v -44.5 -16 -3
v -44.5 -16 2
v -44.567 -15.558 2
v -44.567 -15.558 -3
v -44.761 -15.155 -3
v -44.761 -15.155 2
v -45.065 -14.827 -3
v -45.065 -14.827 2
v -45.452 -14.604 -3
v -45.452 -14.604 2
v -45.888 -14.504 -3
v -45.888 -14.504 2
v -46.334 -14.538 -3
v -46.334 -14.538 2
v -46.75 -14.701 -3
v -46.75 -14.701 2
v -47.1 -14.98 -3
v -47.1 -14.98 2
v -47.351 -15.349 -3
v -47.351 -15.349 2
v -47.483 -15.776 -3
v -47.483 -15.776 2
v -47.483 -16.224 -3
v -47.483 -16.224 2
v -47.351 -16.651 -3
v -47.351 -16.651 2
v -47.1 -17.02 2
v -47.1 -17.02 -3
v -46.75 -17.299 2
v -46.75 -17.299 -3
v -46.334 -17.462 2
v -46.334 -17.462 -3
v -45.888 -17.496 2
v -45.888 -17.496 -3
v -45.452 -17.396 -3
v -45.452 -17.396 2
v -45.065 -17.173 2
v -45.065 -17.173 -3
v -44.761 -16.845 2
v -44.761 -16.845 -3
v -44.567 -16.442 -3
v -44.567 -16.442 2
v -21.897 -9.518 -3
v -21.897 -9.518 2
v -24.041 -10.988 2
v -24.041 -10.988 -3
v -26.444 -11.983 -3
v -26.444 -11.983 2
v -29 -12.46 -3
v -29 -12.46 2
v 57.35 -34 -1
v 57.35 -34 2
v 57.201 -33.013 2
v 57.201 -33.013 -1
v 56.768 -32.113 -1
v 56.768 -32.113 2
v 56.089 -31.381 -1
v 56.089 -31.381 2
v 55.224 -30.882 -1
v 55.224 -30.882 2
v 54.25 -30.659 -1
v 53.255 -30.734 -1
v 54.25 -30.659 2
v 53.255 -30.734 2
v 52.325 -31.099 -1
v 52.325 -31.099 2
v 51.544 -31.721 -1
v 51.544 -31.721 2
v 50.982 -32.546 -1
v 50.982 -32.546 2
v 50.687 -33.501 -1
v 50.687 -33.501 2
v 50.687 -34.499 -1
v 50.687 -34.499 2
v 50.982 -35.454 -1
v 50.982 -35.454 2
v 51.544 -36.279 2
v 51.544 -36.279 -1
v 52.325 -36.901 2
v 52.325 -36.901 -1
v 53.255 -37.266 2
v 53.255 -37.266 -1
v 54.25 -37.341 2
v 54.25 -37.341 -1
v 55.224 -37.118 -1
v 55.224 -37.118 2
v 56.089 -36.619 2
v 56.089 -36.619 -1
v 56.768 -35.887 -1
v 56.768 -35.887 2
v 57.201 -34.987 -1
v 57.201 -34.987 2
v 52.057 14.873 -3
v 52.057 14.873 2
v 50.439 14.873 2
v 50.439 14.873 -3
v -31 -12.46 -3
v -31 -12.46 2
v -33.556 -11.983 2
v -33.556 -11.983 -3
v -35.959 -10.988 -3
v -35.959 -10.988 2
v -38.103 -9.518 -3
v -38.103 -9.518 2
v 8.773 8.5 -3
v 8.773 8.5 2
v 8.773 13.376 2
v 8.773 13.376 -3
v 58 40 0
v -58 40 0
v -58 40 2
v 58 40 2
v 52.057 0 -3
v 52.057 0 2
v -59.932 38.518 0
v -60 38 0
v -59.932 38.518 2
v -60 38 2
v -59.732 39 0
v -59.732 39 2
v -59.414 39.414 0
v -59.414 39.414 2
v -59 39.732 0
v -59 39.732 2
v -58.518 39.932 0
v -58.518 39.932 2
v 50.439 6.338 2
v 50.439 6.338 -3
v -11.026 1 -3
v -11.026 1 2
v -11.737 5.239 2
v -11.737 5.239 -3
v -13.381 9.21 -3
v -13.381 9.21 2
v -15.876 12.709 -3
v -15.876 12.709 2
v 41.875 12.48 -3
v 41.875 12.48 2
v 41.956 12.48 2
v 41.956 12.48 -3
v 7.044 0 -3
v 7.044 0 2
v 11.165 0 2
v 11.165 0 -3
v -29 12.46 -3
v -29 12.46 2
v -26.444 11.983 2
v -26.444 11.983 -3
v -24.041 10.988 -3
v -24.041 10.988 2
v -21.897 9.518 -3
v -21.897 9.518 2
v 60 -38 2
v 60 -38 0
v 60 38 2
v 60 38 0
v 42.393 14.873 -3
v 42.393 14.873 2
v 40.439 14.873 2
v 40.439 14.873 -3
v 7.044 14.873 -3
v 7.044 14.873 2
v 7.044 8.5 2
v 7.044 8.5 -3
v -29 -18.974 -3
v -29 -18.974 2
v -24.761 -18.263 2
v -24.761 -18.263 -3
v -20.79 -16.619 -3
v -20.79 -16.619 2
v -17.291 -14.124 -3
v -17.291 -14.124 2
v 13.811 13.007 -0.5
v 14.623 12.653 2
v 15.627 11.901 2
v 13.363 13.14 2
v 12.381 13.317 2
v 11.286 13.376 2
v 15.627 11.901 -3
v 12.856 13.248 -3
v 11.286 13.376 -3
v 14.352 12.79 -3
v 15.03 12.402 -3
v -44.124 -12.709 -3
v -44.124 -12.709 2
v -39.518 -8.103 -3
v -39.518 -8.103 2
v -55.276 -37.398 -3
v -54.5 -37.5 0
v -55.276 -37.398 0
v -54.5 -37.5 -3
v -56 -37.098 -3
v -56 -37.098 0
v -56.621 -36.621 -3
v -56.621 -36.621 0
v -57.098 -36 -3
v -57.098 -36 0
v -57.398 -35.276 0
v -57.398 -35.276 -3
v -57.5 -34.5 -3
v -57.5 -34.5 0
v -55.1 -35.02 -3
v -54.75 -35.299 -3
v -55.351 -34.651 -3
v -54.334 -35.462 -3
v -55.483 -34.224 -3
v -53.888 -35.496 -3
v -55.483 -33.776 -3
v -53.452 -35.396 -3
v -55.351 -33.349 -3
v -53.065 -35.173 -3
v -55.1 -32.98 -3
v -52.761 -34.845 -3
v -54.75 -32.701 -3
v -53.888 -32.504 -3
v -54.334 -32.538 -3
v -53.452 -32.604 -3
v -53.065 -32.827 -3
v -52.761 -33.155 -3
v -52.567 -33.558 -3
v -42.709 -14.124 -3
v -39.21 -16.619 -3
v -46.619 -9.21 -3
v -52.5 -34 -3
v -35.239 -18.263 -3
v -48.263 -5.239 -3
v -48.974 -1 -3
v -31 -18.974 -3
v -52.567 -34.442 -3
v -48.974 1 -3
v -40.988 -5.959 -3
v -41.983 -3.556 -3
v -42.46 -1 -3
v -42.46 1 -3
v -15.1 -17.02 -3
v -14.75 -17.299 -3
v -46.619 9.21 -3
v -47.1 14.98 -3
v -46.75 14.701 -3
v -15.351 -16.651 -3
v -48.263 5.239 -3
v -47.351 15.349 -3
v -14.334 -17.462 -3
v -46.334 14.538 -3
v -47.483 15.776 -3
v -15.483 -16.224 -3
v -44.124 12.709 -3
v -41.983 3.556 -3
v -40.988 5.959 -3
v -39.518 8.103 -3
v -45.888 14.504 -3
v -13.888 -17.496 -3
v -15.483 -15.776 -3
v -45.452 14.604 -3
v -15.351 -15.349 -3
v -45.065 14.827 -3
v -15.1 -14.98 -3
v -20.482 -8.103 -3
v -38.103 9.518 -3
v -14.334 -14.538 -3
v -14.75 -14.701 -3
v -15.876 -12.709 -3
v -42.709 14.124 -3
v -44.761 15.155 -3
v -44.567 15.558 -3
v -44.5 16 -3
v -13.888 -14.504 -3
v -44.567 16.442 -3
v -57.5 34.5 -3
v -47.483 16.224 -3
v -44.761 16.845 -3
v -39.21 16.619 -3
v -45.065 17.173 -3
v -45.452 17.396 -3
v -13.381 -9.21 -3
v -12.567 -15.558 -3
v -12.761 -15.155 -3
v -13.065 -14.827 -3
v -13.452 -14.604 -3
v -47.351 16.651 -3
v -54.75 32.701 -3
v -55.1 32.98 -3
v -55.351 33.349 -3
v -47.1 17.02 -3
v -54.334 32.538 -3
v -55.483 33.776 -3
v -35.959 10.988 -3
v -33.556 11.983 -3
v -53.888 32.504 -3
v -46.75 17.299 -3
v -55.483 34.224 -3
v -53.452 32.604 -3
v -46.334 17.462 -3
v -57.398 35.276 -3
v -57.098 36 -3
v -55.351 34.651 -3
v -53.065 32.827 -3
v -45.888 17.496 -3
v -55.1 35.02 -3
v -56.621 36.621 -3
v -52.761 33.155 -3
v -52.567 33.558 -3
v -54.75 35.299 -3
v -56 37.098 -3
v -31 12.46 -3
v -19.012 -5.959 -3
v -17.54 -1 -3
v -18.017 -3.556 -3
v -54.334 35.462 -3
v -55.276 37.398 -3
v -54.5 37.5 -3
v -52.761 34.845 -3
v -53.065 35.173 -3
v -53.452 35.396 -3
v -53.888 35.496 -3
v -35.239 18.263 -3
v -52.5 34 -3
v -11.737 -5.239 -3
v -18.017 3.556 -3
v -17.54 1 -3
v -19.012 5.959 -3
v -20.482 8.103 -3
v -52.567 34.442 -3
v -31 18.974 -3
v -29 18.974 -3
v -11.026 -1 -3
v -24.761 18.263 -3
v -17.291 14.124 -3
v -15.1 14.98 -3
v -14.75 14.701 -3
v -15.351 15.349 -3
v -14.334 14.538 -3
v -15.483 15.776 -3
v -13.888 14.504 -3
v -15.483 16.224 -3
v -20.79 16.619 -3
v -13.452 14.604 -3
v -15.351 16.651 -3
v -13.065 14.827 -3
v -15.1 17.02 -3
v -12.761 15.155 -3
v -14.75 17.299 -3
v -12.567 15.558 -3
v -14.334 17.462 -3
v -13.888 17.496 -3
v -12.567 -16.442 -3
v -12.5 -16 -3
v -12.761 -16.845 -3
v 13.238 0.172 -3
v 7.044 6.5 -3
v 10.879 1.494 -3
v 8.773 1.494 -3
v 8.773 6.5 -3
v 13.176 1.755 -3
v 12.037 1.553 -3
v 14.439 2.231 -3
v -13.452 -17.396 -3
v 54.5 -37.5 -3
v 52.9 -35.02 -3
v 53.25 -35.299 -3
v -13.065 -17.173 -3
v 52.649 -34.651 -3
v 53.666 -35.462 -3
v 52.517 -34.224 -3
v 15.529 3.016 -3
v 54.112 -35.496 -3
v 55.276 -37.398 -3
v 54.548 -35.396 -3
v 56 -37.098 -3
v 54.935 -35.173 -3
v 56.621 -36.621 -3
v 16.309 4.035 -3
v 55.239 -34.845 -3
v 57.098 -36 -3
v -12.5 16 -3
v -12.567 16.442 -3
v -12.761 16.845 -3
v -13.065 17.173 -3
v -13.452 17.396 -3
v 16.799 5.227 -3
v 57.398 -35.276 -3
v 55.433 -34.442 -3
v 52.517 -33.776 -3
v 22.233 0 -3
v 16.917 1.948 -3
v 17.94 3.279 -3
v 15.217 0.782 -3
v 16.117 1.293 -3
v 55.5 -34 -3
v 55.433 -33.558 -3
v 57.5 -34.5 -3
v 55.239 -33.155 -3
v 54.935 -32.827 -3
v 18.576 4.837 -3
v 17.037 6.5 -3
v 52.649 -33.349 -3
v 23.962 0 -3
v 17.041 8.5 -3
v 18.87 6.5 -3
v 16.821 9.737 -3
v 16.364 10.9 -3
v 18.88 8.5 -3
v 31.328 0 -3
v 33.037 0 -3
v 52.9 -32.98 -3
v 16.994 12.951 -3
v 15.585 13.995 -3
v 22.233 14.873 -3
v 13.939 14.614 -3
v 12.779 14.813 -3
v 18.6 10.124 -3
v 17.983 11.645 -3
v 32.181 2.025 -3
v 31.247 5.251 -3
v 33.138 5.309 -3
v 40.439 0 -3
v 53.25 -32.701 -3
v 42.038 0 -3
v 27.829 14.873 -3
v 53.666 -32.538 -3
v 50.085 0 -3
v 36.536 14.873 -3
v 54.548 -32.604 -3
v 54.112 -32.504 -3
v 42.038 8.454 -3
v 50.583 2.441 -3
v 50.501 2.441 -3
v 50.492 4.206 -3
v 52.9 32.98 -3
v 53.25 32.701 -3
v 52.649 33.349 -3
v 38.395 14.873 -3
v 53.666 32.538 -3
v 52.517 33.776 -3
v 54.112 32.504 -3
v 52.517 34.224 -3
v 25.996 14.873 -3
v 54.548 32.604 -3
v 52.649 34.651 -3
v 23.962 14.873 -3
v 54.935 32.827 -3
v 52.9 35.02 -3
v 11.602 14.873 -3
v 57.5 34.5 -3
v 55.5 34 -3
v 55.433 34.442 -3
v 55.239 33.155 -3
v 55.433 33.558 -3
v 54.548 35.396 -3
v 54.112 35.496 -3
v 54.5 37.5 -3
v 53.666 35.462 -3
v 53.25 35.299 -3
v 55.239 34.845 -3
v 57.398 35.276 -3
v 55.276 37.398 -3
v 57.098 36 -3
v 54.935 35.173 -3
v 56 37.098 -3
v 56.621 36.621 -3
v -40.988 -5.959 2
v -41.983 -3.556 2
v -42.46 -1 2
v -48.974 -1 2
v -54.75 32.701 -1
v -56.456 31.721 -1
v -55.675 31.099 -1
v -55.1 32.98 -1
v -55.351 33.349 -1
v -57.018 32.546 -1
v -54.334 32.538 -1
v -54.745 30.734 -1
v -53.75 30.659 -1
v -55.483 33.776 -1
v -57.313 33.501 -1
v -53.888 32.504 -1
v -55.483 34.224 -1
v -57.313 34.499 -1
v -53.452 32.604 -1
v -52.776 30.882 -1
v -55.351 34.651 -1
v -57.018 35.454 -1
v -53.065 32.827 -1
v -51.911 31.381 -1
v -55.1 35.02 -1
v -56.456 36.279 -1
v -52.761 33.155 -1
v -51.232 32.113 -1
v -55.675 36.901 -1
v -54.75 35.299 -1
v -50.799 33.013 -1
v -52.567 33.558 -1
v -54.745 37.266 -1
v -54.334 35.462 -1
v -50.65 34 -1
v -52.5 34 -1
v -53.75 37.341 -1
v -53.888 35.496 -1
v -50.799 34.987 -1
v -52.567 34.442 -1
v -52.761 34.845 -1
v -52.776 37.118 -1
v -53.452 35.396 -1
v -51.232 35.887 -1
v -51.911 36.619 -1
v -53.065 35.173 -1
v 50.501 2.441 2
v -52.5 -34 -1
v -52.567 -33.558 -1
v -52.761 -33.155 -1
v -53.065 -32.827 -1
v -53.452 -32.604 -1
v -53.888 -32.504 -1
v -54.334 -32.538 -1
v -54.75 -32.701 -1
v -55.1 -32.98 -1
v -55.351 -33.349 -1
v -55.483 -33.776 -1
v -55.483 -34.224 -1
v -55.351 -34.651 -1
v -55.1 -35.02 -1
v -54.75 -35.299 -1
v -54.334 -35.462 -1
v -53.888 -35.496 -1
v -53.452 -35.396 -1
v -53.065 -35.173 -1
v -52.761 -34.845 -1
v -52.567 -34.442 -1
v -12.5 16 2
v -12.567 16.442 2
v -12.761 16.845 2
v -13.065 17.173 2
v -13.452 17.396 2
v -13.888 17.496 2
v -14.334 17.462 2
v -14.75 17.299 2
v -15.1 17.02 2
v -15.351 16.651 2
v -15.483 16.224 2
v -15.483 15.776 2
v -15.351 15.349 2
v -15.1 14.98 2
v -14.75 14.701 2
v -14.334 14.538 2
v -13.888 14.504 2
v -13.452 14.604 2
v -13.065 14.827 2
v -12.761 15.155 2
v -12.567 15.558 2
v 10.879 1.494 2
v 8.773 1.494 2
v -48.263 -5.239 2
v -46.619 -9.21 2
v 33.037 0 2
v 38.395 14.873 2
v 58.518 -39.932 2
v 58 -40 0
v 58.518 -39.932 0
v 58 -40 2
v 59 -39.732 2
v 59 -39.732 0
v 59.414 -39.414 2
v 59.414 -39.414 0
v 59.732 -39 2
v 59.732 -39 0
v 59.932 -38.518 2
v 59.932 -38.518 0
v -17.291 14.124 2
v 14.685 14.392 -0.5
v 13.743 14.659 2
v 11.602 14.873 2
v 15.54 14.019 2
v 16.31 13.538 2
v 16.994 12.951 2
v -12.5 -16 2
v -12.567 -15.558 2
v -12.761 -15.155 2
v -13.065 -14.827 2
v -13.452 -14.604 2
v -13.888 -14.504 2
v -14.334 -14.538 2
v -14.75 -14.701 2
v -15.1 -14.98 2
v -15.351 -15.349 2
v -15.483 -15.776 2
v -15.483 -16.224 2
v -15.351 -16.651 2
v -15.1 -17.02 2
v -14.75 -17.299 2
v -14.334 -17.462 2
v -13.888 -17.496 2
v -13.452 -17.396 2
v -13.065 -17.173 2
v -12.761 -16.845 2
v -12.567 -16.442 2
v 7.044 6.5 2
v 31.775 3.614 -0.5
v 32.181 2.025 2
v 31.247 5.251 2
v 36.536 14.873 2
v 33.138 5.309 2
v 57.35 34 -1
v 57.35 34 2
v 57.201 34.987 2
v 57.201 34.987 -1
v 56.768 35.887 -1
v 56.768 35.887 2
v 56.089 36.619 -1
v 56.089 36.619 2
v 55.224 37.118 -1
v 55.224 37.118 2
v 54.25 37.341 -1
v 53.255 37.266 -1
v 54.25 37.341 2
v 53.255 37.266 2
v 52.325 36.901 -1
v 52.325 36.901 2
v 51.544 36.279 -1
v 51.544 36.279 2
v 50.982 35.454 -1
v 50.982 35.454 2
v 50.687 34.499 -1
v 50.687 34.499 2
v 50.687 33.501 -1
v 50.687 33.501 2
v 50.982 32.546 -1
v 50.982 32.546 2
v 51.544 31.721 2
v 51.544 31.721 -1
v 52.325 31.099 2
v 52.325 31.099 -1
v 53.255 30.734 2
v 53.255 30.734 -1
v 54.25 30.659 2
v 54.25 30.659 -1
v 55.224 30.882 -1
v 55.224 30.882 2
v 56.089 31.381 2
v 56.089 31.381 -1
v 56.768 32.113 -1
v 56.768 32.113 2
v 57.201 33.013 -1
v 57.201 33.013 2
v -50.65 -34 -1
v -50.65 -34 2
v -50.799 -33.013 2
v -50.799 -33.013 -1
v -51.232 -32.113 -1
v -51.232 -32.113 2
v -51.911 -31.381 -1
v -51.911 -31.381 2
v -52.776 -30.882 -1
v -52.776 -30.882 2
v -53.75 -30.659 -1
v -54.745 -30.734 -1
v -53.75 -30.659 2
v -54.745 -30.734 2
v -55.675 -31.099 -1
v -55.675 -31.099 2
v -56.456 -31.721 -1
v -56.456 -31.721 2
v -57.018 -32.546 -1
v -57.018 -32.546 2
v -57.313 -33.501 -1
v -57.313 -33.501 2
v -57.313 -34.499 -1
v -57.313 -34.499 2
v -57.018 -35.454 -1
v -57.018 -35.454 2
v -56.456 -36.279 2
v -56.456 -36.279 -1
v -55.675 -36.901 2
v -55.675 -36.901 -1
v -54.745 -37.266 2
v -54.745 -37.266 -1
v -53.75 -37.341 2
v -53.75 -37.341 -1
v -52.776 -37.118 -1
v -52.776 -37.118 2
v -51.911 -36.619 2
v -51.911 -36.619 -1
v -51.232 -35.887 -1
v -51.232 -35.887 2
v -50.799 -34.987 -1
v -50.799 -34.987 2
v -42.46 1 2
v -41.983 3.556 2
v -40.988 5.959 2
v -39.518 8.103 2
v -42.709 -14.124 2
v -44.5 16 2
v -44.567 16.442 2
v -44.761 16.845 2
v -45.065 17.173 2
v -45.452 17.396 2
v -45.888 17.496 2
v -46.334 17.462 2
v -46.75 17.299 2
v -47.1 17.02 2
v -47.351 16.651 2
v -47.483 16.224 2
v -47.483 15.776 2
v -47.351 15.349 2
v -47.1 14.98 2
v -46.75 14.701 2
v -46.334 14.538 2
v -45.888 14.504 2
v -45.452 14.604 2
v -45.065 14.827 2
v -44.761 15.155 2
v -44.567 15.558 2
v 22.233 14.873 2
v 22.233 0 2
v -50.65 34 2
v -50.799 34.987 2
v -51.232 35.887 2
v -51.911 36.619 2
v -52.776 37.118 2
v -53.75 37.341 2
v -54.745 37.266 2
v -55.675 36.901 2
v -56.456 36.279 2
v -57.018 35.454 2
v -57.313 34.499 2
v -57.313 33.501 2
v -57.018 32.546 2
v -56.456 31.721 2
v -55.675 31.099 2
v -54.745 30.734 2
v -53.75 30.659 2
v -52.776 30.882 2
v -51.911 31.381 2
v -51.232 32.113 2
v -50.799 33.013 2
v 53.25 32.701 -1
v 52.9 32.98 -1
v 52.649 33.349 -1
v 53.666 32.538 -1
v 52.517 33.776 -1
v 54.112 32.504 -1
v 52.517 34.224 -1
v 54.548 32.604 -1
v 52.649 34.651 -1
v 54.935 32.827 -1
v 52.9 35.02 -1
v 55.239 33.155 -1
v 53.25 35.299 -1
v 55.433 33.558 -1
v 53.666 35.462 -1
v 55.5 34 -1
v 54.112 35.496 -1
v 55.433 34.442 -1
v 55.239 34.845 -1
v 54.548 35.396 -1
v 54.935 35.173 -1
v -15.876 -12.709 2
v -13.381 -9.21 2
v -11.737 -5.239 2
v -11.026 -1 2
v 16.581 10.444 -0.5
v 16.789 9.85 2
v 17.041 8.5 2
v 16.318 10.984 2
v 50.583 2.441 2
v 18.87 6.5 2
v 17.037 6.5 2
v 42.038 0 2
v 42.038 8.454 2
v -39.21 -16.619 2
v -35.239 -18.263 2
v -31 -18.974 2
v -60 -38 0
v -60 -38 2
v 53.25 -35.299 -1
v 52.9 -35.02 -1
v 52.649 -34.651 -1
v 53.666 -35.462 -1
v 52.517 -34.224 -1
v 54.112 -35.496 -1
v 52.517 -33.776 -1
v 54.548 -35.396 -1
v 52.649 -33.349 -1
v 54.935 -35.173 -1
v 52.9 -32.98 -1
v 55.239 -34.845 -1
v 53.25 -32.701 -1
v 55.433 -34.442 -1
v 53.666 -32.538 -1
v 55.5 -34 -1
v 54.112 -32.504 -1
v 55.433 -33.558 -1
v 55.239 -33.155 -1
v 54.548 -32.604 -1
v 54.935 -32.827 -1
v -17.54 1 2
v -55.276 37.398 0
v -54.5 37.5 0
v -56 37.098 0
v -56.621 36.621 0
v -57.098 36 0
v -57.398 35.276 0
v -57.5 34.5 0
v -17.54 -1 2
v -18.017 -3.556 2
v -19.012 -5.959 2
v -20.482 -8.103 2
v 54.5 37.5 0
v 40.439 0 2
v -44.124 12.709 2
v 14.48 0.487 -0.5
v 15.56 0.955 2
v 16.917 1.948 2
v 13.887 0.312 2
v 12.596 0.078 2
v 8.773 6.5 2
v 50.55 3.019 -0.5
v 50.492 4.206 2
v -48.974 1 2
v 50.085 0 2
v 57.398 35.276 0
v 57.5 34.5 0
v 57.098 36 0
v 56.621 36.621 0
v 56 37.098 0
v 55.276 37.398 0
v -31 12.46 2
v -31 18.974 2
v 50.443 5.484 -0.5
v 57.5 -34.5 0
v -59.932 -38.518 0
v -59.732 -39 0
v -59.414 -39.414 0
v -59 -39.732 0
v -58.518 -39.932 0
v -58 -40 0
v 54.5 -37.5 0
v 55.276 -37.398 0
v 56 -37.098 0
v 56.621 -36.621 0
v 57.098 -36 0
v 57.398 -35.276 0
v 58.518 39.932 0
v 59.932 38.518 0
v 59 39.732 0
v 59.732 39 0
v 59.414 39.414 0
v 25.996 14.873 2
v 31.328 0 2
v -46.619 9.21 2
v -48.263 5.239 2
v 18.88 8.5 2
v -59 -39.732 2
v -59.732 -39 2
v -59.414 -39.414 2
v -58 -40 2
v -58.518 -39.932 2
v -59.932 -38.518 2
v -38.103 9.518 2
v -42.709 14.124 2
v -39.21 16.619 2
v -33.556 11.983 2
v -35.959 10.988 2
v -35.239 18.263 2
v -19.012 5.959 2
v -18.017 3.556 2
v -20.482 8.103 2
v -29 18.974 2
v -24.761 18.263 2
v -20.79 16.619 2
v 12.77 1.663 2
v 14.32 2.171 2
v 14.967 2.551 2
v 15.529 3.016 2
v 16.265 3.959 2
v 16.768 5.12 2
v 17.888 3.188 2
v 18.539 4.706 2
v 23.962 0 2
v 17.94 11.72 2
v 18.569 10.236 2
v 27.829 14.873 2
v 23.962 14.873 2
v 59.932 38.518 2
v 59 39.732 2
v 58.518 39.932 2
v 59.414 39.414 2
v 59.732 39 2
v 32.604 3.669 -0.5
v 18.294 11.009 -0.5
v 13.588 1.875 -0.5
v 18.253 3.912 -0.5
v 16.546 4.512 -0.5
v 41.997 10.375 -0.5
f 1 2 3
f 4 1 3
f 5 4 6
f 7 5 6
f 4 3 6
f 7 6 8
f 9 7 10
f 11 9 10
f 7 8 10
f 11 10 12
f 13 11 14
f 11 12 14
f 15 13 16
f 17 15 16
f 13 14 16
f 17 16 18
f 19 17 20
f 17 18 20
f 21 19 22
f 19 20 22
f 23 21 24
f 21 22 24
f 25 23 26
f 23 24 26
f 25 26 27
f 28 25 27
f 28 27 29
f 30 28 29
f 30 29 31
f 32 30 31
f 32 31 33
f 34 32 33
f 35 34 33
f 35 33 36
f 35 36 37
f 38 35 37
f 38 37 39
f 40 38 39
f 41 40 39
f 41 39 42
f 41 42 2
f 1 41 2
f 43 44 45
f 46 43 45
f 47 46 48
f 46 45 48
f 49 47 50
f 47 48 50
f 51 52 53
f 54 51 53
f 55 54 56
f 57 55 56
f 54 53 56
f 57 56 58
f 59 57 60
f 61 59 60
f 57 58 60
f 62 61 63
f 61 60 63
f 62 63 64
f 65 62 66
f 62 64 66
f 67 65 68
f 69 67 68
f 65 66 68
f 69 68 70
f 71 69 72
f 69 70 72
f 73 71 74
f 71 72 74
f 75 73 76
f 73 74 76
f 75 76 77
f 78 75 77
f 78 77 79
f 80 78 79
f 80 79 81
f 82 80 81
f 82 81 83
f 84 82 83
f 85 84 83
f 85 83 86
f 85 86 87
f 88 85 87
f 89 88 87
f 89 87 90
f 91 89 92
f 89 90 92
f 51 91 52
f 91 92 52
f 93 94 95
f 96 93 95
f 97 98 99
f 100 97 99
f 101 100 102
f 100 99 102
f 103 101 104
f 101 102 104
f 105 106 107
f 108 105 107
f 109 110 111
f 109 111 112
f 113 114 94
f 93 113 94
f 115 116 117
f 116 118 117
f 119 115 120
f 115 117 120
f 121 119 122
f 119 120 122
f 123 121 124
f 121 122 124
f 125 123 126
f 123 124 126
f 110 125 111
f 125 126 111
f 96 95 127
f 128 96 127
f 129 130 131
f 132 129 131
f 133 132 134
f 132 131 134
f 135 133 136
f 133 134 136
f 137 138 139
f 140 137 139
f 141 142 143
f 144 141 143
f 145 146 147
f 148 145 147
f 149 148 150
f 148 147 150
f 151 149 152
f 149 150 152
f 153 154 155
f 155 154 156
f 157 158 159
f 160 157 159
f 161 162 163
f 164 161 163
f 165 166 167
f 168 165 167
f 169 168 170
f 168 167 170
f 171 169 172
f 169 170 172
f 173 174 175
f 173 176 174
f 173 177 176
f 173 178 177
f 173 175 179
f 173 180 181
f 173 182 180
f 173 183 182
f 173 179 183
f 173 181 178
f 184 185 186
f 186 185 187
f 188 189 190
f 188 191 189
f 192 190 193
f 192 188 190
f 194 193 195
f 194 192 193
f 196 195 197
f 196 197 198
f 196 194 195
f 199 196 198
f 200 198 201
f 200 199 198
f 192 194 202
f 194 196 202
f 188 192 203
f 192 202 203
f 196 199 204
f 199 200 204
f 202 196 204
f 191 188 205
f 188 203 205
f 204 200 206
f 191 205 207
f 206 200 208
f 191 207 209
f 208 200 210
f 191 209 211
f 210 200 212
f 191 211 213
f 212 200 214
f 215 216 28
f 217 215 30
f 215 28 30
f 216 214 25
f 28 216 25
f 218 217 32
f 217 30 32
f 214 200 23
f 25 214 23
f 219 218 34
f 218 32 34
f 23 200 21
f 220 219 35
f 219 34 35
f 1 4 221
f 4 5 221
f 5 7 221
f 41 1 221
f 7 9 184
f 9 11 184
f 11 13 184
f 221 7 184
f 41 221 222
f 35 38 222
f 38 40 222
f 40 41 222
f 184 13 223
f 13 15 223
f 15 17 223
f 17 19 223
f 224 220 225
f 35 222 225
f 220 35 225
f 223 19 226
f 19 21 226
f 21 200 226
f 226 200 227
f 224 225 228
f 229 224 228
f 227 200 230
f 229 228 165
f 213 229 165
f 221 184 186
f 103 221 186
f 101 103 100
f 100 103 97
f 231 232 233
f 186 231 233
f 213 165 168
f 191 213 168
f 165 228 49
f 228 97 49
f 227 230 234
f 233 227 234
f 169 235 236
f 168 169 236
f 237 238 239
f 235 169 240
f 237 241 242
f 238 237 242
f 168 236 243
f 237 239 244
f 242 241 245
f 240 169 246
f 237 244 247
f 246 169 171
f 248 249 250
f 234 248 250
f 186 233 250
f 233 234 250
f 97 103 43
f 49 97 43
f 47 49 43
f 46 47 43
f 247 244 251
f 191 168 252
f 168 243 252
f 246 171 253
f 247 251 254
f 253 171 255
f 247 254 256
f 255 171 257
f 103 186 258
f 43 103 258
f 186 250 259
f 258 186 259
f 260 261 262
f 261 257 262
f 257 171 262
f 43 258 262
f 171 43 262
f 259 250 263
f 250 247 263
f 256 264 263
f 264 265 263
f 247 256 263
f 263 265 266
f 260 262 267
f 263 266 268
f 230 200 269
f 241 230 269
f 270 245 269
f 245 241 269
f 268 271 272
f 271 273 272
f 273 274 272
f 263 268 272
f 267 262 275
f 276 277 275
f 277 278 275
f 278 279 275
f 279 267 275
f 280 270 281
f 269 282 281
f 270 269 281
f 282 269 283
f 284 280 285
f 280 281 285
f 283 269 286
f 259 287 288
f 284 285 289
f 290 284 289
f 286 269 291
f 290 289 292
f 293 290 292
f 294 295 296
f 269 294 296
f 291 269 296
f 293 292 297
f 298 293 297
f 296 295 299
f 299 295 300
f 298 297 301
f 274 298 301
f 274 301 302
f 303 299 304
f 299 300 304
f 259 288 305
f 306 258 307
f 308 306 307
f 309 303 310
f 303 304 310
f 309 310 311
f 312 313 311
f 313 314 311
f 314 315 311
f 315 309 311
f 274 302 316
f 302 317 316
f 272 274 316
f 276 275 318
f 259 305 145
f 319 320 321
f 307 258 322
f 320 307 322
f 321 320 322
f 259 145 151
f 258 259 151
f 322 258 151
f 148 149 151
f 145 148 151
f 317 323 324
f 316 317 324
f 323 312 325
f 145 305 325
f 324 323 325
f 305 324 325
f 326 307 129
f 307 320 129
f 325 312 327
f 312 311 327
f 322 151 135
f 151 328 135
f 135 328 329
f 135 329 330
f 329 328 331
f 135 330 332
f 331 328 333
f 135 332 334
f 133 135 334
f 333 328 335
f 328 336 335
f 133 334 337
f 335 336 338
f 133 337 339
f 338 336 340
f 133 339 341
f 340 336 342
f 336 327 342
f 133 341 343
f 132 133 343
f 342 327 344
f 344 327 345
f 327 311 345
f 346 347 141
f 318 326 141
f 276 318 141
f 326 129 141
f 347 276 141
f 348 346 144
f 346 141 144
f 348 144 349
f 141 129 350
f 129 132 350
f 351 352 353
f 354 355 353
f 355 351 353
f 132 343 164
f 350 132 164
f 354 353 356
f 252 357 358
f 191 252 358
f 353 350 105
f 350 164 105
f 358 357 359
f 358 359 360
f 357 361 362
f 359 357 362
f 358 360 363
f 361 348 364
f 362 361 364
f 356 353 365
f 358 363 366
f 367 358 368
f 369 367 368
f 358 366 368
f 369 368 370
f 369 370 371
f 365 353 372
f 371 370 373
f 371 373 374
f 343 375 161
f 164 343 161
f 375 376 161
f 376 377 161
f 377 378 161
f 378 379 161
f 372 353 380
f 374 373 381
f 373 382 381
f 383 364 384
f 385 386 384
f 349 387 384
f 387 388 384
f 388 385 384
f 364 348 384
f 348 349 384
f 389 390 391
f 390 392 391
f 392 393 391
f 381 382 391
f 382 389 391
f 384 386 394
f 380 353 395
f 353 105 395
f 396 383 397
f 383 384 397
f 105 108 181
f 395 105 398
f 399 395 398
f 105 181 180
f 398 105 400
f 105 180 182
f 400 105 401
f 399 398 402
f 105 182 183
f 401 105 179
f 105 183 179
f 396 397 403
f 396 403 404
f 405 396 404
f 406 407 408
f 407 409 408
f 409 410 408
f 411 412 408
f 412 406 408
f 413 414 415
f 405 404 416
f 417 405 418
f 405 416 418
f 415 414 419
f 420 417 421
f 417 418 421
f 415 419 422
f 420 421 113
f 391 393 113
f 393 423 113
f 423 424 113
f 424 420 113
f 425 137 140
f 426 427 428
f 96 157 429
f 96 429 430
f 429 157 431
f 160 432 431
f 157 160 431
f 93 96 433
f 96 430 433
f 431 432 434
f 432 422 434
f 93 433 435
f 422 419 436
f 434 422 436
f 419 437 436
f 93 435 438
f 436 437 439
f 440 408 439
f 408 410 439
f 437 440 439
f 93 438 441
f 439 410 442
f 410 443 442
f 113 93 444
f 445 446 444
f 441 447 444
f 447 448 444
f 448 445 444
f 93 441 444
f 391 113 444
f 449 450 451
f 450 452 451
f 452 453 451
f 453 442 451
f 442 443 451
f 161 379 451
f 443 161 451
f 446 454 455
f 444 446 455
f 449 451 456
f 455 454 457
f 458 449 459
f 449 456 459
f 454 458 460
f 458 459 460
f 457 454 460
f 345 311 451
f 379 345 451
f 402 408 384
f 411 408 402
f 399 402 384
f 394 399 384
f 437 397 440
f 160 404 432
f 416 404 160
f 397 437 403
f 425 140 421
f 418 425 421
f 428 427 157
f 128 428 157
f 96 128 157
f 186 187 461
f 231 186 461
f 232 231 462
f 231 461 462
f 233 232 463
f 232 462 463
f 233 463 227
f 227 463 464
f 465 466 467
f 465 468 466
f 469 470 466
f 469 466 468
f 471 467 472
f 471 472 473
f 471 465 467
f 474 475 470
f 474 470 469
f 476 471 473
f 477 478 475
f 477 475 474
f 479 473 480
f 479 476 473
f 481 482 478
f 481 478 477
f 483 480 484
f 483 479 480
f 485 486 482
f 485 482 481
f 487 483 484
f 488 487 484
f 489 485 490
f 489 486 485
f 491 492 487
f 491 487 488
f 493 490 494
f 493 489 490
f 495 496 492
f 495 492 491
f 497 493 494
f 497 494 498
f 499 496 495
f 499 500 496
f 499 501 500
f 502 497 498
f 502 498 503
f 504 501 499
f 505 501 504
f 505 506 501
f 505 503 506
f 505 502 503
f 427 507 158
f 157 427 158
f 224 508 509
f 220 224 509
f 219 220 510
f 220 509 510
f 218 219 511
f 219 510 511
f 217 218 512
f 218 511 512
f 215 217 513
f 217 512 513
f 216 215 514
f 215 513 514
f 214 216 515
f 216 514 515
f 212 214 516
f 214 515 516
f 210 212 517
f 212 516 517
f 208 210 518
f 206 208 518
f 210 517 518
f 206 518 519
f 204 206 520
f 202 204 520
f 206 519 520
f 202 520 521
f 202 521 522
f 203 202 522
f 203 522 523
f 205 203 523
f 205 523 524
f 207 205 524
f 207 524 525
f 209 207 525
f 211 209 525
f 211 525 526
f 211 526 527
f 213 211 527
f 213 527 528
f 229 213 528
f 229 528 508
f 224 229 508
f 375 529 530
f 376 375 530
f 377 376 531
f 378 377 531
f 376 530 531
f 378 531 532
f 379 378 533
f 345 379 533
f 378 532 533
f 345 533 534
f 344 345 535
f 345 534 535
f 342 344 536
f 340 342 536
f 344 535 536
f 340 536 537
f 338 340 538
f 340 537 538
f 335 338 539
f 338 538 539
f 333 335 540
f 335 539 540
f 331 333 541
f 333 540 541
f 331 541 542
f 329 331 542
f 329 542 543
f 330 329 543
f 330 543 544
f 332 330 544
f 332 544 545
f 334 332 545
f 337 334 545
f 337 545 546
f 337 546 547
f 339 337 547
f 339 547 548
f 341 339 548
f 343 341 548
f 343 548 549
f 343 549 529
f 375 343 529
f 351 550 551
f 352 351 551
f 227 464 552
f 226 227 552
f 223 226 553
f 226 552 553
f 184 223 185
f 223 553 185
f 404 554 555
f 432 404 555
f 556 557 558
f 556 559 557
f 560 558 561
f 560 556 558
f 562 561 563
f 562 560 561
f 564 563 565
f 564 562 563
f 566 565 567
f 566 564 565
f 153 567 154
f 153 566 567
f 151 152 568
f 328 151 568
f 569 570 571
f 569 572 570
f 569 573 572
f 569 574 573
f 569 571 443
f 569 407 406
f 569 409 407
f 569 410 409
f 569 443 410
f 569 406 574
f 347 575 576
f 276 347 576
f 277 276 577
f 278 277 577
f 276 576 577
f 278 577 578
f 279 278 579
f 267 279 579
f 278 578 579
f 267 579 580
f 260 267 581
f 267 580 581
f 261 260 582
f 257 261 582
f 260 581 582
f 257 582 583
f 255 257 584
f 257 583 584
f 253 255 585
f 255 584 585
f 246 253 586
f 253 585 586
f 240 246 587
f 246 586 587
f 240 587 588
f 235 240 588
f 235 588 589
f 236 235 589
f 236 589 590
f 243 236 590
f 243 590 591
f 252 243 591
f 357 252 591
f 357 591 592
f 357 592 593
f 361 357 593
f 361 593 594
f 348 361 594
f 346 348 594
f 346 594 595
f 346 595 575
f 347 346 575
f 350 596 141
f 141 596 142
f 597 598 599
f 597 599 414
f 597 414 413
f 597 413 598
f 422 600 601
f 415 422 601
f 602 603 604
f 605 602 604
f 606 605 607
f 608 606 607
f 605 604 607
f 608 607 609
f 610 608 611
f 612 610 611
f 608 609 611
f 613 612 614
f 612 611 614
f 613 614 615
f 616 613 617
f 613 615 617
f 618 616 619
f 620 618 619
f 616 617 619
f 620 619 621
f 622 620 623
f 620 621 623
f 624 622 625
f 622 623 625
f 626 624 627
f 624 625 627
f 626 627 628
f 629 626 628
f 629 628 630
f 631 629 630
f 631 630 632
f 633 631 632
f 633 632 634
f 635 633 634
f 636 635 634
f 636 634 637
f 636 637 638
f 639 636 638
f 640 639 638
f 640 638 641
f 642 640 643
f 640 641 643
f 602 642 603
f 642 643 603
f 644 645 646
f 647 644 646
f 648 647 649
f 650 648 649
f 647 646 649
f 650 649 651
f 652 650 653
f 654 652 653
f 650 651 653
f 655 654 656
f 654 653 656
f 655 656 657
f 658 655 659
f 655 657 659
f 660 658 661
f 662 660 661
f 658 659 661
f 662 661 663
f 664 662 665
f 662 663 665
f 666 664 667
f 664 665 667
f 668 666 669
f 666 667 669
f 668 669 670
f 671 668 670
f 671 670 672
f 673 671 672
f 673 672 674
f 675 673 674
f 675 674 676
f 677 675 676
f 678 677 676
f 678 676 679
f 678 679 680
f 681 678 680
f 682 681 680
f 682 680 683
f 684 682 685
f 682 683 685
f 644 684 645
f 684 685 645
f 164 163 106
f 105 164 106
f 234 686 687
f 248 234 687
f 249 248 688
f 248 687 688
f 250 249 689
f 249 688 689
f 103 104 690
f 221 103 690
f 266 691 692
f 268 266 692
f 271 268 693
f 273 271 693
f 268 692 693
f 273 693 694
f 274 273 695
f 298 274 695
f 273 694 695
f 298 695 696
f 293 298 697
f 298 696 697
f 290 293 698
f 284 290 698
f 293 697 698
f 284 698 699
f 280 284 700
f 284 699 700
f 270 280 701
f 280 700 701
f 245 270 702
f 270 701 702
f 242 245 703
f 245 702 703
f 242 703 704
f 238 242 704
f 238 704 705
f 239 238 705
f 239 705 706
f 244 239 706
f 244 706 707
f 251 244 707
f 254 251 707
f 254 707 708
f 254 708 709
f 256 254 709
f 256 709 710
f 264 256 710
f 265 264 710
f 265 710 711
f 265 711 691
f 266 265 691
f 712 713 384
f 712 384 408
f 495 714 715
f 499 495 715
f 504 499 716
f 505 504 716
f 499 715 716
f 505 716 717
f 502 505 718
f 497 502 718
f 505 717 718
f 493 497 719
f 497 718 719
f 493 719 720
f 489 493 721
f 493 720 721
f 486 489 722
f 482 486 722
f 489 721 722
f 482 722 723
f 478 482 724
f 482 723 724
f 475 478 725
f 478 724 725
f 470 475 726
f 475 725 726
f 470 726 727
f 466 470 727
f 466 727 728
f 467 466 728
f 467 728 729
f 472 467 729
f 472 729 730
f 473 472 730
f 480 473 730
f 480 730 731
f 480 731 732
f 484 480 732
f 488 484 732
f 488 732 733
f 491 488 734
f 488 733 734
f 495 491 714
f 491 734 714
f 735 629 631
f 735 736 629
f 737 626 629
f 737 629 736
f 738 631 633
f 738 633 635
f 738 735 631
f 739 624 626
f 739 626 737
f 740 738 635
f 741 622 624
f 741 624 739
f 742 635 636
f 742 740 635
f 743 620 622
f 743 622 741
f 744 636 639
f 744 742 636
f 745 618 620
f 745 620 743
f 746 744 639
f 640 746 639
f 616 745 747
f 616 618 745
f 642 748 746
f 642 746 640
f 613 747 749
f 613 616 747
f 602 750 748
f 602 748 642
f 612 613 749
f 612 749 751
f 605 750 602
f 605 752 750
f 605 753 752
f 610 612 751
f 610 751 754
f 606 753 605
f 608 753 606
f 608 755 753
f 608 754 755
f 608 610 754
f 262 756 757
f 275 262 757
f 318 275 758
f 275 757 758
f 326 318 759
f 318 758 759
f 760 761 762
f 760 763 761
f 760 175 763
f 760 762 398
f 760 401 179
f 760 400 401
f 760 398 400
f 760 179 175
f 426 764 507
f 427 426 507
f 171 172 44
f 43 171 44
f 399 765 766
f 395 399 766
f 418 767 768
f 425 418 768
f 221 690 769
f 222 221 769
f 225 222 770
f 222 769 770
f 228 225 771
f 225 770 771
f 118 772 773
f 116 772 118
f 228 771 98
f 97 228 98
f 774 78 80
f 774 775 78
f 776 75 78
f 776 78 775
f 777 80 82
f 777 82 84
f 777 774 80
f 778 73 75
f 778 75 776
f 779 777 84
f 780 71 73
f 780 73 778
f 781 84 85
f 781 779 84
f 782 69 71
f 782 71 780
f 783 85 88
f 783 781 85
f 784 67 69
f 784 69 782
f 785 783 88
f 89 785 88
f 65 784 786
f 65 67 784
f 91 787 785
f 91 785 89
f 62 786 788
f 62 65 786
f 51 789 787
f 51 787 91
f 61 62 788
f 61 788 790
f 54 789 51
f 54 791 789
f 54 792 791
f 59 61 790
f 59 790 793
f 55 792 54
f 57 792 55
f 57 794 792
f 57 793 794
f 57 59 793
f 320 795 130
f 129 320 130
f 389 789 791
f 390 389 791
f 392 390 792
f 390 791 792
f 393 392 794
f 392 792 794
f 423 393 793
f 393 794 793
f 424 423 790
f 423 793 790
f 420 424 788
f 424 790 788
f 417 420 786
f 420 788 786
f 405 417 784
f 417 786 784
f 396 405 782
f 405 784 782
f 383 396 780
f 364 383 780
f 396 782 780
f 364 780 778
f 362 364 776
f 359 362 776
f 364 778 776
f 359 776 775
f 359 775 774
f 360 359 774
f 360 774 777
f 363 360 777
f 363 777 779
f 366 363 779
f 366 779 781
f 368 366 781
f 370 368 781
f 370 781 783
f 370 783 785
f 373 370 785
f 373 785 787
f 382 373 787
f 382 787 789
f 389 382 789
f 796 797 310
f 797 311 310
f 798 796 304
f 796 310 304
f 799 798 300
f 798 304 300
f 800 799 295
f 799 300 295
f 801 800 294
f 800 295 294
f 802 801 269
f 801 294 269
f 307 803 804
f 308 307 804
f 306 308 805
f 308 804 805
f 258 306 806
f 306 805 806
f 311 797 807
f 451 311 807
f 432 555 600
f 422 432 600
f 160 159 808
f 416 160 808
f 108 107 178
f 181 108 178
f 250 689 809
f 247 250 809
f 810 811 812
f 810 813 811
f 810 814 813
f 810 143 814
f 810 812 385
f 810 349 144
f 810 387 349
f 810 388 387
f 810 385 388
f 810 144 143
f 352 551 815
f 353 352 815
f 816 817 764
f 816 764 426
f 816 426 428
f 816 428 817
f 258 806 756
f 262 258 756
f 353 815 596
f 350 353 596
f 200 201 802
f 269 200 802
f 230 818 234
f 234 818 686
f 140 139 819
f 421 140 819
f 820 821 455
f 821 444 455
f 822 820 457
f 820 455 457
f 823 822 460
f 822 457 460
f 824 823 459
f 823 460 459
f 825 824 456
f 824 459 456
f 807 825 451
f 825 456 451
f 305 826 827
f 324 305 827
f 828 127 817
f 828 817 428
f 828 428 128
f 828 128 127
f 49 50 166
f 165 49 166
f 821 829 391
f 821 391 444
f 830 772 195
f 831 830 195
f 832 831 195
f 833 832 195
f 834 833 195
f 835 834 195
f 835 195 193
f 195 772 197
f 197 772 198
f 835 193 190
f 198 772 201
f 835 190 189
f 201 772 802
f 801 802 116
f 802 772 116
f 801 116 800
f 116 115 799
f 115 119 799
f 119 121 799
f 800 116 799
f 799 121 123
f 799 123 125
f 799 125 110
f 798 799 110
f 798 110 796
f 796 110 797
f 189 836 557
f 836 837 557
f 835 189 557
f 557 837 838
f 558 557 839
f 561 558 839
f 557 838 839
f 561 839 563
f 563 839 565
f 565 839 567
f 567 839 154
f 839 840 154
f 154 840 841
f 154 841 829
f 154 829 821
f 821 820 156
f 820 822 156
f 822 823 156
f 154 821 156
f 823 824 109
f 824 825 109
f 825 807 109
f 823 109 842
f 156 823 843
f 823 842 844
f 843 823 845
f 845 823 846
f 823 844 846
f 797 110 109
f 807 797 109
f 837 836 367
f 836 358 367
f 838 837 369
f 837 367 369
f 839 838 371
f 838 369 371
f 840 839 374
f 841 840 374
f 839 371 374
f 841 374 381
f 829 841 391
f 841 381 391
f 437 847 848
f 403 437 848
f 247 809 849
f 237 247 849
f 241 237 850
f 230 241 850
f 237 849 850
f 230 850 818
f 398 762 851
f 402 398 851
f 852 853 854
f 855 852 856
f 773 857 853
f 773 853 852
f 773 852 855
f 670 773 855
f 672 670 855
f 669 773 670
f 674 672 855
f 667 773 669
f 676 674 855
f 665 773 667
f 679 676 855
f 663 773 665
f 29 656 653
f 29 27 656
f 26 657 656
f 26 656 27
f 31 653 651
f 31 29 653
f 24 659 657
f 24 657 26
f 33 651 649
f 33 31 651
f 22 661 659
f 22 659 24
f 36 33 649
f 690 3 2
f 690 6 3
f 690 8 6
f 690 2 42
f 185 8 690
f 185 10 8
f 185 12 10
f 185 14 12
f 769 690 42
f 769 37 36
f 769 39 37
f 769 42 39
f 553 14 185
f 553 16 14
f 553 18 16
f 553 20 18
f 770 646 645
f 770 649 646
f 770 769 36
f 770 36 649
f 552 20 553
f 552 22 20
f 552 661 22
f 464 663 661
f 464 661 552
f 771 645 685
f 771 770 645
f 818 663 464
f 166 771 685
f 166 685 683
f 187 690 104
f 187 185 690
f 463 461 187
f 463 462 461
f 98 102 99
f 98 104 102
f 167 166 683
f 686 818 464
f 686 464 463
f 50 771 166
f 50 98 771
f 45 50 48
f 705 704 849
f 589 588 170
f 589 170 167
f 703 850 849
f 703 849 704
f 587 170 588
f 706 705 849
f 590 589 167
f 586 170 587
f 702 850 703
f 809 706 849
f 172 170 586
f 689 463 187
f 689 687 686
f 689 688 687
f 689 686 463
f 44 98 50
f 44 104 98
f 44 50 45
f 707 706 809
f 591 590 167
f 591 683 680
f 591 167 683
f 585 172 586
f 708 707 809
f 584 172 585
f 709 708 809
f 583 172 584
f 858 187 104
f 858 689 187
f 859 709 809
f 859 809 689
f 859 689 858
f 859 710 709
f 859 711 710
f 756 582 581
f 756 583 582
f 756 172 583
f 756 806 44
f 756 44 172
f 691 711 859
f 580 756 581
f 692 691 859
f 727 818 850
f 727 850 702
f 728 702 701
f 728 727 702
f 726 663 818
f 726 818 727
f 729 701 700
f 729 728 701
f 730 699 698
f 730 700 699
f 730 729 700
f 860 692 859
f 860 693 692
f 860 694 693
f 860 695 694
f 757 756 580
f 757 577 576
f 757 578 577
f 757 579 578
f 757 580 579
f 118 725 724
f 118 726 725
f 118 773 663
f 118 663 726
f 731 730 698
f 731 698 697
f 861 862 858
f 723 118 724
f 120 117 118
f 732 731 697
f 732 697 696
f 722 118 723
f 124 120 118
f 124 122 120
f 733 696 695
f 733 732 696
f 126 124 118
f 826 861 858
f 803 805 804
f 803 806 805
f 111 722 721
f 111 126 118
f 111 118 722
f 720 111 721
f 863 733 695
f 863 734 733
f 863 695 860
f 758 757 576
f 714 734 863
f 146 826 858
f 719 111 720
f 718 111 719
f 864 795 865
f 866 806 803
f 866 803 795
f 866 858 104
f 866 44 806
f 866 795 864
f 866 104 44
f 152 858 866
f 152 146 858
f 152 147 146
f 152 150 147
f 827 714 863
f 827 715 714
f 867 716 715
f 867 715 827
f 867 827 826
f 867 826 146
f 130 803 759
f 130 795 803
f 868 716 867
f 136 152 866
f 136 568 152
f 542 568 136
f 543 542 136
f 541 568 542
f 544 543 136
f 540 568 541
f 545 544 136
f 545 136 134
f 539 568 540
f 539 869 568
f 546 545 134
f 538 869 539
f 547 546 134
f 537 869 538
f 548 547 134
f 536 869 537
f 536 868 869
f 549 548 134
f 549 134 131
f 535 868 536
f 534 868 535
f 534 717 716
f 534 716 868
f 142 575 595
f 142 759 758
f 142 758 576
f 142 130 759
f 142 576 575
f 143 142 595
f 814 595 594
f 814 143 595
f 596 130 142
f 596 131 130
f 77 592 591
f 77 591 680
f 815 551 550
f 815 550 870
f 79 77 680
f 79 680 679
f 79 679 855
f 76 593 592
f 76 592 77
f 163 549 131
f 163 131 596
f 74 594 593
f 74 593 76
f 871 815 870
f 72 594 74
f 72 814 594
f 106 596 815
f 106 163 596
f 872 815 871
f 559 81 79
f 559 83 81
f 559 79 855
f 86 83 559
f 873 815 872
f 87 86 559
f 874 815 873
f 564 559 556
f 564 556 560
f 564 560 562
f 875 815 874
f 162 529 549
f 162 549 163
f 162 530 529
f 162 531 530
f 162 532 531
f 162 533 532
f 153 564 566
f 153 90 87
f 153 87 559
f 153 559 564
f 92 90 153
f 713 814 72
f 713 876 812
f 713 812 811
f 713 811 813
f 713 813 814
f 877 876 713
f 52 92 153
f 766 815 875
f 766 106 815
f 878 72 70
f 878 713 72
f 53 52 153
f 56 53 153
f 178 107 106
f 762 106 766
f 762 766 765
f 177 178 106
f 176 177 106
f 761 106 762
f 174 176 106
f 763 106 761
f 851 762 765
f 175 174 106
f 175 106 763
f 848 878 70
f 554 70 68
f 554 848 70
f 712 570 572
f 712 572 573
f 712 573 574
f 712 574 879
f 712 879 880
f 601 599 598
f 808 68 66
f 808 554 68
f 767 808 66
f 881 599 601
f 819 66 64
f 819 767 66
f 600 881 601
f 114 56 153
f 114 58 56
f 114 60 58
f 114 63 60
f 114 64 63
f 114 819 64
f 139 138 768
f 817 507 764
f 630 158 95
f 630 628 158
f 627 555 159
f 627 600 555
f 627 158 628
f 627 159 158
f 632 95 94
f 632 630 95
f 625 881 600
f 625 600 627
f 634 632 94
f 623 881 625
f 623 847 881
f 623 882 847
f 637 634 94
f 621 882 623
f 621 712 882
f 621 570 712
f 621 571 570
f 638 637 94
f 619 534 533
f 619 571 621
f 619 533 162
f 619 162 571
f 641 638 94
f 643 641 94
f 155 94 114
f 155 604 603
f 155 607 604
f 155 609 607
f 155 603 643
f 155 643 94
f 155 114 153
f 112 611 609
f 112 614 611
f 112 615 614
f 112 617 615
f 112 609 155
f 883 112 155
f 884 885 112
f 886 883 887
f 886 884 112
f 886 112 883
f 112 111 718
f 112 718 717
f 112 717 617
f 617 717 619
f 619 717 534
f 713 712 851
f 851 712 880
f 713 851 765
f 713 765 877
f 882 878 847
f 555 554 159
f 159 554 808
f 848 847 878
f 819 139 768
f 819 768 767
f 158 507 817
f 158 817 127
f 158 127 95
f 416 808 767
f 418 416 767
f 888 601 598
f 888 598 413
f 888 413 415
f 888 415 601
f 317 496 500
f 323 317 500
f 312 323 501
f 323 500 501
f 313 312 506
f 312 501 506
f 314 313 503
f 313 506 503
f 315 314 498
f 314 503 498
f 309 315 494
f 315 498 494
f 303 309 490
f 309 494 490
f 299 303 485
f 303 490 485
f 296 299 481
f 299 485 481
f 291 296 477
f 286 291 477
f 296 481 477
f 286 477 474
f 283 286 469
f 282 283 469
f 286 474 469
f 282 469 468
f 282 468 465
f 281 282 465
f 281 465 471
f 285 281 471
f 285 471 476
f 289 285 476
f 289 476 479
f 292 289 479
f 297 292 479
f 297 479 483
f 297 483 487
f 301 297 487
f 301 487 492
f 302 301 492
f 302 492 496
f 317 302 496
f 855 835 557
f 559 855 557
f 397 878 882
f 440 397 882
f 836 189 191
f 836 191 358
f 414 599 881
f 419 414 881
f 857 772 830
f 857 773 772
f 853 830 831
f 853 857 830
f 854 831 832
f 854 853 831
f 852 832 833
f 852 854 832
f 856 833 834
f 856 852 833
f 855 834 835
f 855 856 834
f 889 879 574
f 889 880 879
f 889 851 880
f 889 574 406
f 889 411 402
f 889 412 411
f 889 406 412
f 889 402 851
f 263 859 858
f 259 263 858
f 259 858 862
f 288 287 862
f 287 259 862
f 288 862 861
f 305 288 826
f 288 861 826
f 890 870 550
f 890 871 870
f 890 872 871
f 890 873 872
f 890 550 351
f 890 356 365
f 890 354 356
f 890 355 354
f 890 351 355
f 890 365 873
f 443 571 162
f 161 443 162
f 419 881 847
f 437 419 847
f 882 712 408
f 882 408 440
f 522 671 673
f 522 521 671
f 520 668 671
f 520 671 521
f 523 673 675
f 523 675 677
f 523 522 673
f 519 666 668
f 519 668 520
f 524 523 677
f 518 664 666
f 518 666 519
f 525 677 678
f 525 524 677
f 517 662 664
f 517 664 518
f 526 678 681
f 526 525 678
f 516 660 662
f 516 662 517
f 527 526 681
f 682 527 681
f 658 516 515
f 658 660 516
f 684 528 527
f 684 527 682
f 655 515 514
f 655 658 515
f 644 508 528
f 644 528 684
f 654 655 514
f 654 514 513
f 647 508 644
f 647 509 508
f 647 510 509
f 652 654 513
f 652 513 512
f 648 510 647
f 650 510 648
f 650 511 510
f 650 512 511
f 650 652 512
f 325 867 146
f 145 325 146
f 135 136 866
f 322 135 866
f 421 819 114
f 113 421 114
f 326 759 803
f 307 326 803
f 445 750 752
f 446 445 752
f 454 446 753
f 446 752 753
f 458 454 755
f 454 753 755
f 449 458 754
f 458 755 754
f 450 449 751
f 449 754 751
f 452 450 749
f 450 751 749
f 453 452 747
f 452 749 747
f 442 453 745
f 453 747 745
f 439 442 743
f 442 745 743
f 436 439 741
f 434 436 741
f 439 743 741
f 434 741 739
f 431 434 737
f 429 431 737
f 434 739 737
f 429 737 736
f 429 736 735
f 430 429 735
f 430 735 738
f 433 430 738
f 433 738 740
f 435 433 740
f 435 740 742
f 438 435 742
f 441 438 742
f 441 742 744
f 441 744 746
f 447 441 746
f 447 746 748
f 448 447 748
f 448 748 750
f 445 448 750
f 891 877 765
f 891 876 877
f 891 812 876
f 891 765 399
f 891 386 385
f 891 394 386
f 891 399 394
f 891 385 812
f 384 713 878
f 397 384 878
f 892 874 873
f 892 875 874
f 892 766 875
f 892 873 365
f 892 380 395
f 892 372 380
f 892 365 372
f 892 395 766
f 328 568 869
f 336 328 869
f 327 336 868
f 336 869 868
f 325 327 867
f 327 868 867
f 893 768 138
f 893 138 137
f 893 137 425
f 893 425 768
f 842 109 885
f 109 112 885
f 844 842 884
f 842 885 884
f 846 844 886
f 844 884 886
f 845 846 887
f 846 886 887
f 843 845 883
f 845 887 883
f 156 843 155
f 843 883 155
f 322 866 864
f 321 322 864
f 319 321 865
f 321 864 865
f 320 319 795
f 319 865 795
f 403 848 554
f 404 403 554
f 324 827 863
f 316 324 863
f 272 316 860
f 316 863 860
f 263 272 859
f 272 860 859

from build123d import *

# Parameters (mm, degrees)
F0_W      = 120
F0_H      = 80
F0_W_2    = 115
F0_H_2    = 75
F1_DEPTH  = 2
F2_W      = 115
F2_H      = 75
F3_DEPTH  = 5
F5_R      = 3
F6_R      = 2
F7_R      = 1.5
F8_DEPTH  = 25
F9_R      = 3.35
F9_R_2    = 1.5
F10_DEPTH = 3
F11_R     = 1.5
F11_W     = 1.728515625
F11_H     = 14.873046875
F12_DEPTH = 25


with BuildPart() as f1:
    # F0 (on Top) → F1 (new body)
    with BuildSketch(Plane.XY):
        Rectangle(F0_W, F0_H)
        Rectangle(F0_W_2, F0_H_2, mode=Mode.SUBTRACT)
    extrude(amount=F1_DEPTH)


with BuildPart() as f3:
    # F2 (on face) → F3 (new body)
    with BuildSketch(Plane.XY.offset(2)):
        Rectangle(F2_W, F2_H)
    extrude(amount=-F3_DEPTH)

    # F4: union F1
    add(f1.part)

    # F5
    f5_edges = [f3.edges().sort_by_distance(p)[0] for p in [
        (-57.5, 37.5, -1.5),
        (-57.5, -37.5, -1.5),
        (57.5, -37.5, -1.5),
        (57.5, 37.5, -1.5),
    ]]
    fillet(f5_edges, radius=F5_R)

    # F6
    f6_edges = [f3.edges().sort_by_distance(p)[0] for p in [
        (60, 40, 1),
        (60, -40, 1),
        (-60, -40, 1),
        (-60, 40, 1),
    ]]
    fillet(f6_edges, radius=F6_R)

    # F7 (on face) → F8 (cut)
    with BuildSketch(Plane.XY.offset(2)):
        with Locations((-54, 34)):
            Circle(F7_R)
        with Locations((54, 34)):
            Circle(F7_R)
        with Locations((-54, -34)):
            Circle(F7_R)
        with Locations((54, -34)):
            Circle(F7_R)
    extrude(amount=-F8_DEPTH, mode=Mode.SUBTRACT)

    # F9 (on face) → F10 (cut)
    with BuildSketch(Plane.XY.offset(2)):
        with Locations((-54, 34)):
            Circle(F9_R)
        with Locations((-54, 34)):
            Circle(F9_R_2, mode=Mode.SUBTRACT)
        with Locations((54, 34)):
            Circle(F9_R)
        with Locations((54, 34)):
            Circle(F9_R_2, mode=Mode.SUBTRACT)
        with Locations((54, -34)):
            Circle(F9_R)
        with Locations((54, -34)):
            Circle(F9_R_2, mode=Mode.SUBTRACT)
        with Locations((-54, -34)):
            Circle(F9_R)
        with Locations((-54, -34)):
            Circle(F9_R_2, mode=Mode.SUBTRACT)
    extrude(amount=-F10_DEPTH, mode=Mode.SUBTRACT)

    # F11 (on face) → F12 (cut)
    with BuildSketch(Plane.XY.offset(2)):
        with BuildLine():
            Line((-17.5400642056, 1), (-11.026334039, 1))
            ThreePointArc((-11.026334039, 1), (-12.4462888823, 7.2709852149), (-15.8764853538, 12.7093010838))
            Line((-15.8764853538, 12.7093010838), (-20.4823881255, 8.1033983122))
            ThreePointArc((-20.4823881255, 8.1033983122), (-18.4515058436, 4.7835429046), (-17.5400642056, 1))
        make_face()
        with Locations((-14, 16)):
            Circle(F11_R)
        with BuildLine():
            Line((-21.8966016878, 9.5176118745), (-17.2906989162, 14.1235146462))
            ThreePointArc((-17.2906989162, 14.1235146462), (-22.7290147851, 17.5537111177), (-29, 18.973665961))
            Line((-29, 18.973665961), (-29, 12.4599357944))
            ThreePointArc((-29, 12.4599357944), (-25.2164570954, 11.5484941564), (-21.8966016878, 9.5176118745))
        make_face()
        with BuildLine():
            Line((-31, 12.4599357944), (-31, 18.973665961))
            ThreePointArc((-31, 18.973665961), (-37.2709852149, 17.5537111177), (-42.7093010838, 14.1235146462))
            Line((-42.7093010838, 14.1235146462), (-38.1033983122, 9.5176118745))
            ThreePointArc((-38.1033983122, 9.5176118745), (-34.7835429046, 11.5484941564), (-31, 12.4599357944))
        make_face()
        with BuildLine():
            Line((-39.5176118745, 8.1033983122), (-44.1235146462, 12.7093010838))
            ThreePointArc((-44.1235146462, 12.7093010838), (-47.5537111177, 7.2709852149), (-48.973665961, 1))
            Line((-48.973665961, 1), (-42.4599357944, 1))
            ThreePointArc((-42.4599357944, 1), (-41.5484941564, 4.7835429046), (-39.5176118745, 8.1033983122))
        make_face()
        with BuildLine():
            ThreePointArc((-48.973665961, -1), (-47.5537111177, -7.2709852149), (-44.1235146462, -12.7093010838))
            Line((-44.1235146462, -12.7093010838), (-39.5176118745, -8.1033983122))
            ThreePointArc((-39.5176118745, -8.1033983122), (-41.5484941564, -4.7835429046), (-42.4599357944, -1))
            Line((-42.4599357944, -1), (-48.973665961, -1))
        make_face()
        with BuildLine():
            ThreePointArc((-42.7093010838, -14.1235146462), (-37.2709852149, -17.5537111177), (-31, -18.973665961))
            Line((-31, -18.973665961), (-31, -12.4599357944))
            ThreePointArc((-31, -12.4599357944), (-34.7835429046, -11.5484941564), (-38.1033983122, -9.5176118745))
            Line((-38.1033983122, -9.5176118745), (-42.7093010838, -14.1235146462))
        make_face()
        with BuildLine():
            ThreePointArc((-29, -18.973665961), (-22.7290147851, -17.5537111177), (-17.2906989162, -14.1235146462))
            Line((-17.2906989162, -14.1235146462), (-21.8966016878, -9.5176118745))
            ThreePointArc((-21.8966016878, -9.5176118745), (-25.2164570954, -11.5484941564), (-29, -12.4599357944))
            Line((-29, -12.4599357944), (-29, -18.973665961))
        make_face()
        with BuildLine():
            ThreePointArc((-15.8764853538, -12.7093010838), (-12.4462888823, -7.2709852149), (-11.026334039, -1))
            Line((-11.026334039, -1), (-17.5400642056, -1))
            ThreePointArc((-17.5400642056, -1), (-18.4515058436, -4.7835429046), (-20.4823881255, -8.1033983122))
            Line((-20.4823881255, -8.1033983122), (-15.8764853538, -12.7093010838))
        make_face()
        with Locations((-14, -16)):
            Circle(F11_R)
        with Locations((-46, -16)):
            Circle(F11_R)
        with Locations((-46, 16)):
            Circle(F11_R)
        with Locations((23.0973307292, 7.4365234375)):
            Rectangle(F11_W, F11_H)
        with BuildLine():
            Line((38.3951822917, 14.873046875), (36.5364583333, 14.873046875))
            Line((36.5364583333, 14.873046875), (33.1380208333, 5.3092447917))
            add(Edge.make_bspline(
                [(32.1809895833, 2.0247395833), (32.548828125, 3.671875), (33.1380208333, 5.3092447917)],
                knots=[0, 0, 0, 1, 1, 1], degree=2))
            add(Edge.make_bspline(
                [(31.2467447917, 5.2506510417), (31.8359375, 3.5904947917), (32.1809895833, 2.0247395833)],
                knots=[0, 0, 0, 1, 1, 1], degree=2))
            Line((31.2467447917, 5.2506510417), (27.8287760417, 14.873046875))
            Line((27.8287760417, 14.873046875), (25.99609375, 14.873046875))
            Line((25.99609375, 14.873046875), (31.328125, 0))
            Line((31.328125, 0), (33.037109375, 0))
            Line((33.037109375, 0), (38.3951822917, 14.873046875))
        make_face()
        with BuildLine():
            Line((50.0846354167, 0), (52.0572916667, 0))
            Line((52.0572916667, 0), (52.0572916667, 14.873046875))
            Line((52.0572916667, 14.873046875), (50.439453125, 14.873046875))
            Line((50.439453125, 14.873046875), (50.439453125, 6.337890625))
            add(Edge.make_bspline(
                [(50.4915364583, 4.2057291667), (50.419921875, 5.6966145833), (50.439453125, 6.337890625)],
                knots=[0, 0, 0, 1, 1, 1], degree=2))
            add(Edge.make_bspline(
                [(50.5826822917, 2.44140625), (50.5631510417, 2.71484375), (50.4915364583, 4.2057291667)],
                knots=[0, 0, 0, 1, 1, 1], degree=2))
            Line((50.5826822917, 2.44140625), (50.5013020833, 2.44140625))
            Line((50.5013020833, 2.44140625), (42.392578125, 14.873046875))
            Line((42.392578125, 14.873046875), (40.439453125, 14.873046875))
            Line((40.439453125, 14.873046875), (40.439453125, 0))
            Line((40.439453125, 0), (42.0377604167, 0))
            Line((42.0377604167, 0), (42.0377604167, 8.4537760417))
            add(Edge.make_bspline(
                [(41.875, 12.48046875), (42.0377604167, 10.283203125), (42.0377604167, 8.4537760417)],
                knots=[0, 0, 0, 1, 1, 1], degree=2))
            Line((41.875, 12.48046875), (41.9563802083, 12.48046875))
            Line((41.9563802083, 12.48046875), (50.0846354167, 0))
        make_face()
        with BuildLine():
            Line((7.0442708333, 14.873046875), (7.0442708333, 8.5))
            Line((7.0442708333, 8.5), (8.7727864583, 8.5))
            Line((8.7727864583, 8.5), (8.7727864583, 13.3756510417))
            Line((8.7727864583, 13.3756510417), (11.2858072917, 13.3756510417))
            add(Edge.make_bspline(
                [(15.6266276042, 11.9010416667), (14.1666666667, 13.3756510417), (11.2858072917, 13.3756510417)],
                knots=[0, 0, 0, 1, 1, 1], degree=2))
            add(Edge.make_bspline(
                [(17.0409949545, 8.5), (16.8285868821, 10.6870225966), (15.6266276042, 11.9010416667)],
                knots=[0.1767181936, 0.1767181936, 0.1767181936, 1, 1, 1], degree=2))
            Line((17.0409949545, 8.5), (18.8795207861, 8.5))
            add(Edge.make_bspline(
                [(16.9938151042, 12.9508463542), (18.6511564201, 11.2935050382), (18.8795207861, 8.5)],
                knots=[0, 0, 0, 0.8622104187, 0.8622104187, 0.8622104187], degree=2))
            add(Edge.make_bspline(
                [(11.6015625, 14.873046875), (15.0716145833, 14.873046875), (16.9938151042, 12.9508463542)],
                knots=[0, 0, 0, 1, 1, 1], degree=2))
            Line((11.6015625, 14.873046875), (7.0442708333, 14.873046875))
        make_face()
        with BuildLine():
            Line((8.7727864583, 6.5), (7.0442708333, 6.5))
            Line((7.0442708333, 6.5), (7.0442708333, 0))
            Line((7.0442708333, 0), (11.1653645833, 0))
            add(Edge.make_bspline(
                [(16.9173177083, 1.9482421875), (14.9186197917, 0), (11.1653645833, 0)],
                knots=[0, 0, 0, 1, 1, 1], degree=2))
            add(Edge.make_bspline(
                [(18.8699305641, 6.5), (18.6125191418, 3.600649448), (16.9173177083, 1.9482421875)],
                knots=[0.1518471004, 0.1518471004, 0.1518471004, 1, 1, 1], degree=2))
            Line((18.8699305641, 6.5), (17.0370247976, 6.5))
            add(Edge.make_bspline(
                [(15.5289713542, 3.0159505208), (16.8087372513, 4.2662965123), (17.0370247976, 6.5)],
                knots=[0, 0, 0, 0.8216177296, 0.8216177296, 0.8216177296], degree=2))
            add(Edge.make_bspline(
                [(10.87890625, 1.494140625), (13.9713541667, 1.494140625), (15.5289713542, 3.0159505208)],
                knots=[0, 0, 0, 1, 1, 1], degree=2))
            Line((10.87890625, 1.494140625), (8.7727864583, 1.494140625))
            Line((8.7727864583, 1.494140625), (8.7727864583, 6.5))
        make_face()
    extrude(amount=-F12_DEPTH, mode=Mode.SUBTRACT)


solid = f3.part
